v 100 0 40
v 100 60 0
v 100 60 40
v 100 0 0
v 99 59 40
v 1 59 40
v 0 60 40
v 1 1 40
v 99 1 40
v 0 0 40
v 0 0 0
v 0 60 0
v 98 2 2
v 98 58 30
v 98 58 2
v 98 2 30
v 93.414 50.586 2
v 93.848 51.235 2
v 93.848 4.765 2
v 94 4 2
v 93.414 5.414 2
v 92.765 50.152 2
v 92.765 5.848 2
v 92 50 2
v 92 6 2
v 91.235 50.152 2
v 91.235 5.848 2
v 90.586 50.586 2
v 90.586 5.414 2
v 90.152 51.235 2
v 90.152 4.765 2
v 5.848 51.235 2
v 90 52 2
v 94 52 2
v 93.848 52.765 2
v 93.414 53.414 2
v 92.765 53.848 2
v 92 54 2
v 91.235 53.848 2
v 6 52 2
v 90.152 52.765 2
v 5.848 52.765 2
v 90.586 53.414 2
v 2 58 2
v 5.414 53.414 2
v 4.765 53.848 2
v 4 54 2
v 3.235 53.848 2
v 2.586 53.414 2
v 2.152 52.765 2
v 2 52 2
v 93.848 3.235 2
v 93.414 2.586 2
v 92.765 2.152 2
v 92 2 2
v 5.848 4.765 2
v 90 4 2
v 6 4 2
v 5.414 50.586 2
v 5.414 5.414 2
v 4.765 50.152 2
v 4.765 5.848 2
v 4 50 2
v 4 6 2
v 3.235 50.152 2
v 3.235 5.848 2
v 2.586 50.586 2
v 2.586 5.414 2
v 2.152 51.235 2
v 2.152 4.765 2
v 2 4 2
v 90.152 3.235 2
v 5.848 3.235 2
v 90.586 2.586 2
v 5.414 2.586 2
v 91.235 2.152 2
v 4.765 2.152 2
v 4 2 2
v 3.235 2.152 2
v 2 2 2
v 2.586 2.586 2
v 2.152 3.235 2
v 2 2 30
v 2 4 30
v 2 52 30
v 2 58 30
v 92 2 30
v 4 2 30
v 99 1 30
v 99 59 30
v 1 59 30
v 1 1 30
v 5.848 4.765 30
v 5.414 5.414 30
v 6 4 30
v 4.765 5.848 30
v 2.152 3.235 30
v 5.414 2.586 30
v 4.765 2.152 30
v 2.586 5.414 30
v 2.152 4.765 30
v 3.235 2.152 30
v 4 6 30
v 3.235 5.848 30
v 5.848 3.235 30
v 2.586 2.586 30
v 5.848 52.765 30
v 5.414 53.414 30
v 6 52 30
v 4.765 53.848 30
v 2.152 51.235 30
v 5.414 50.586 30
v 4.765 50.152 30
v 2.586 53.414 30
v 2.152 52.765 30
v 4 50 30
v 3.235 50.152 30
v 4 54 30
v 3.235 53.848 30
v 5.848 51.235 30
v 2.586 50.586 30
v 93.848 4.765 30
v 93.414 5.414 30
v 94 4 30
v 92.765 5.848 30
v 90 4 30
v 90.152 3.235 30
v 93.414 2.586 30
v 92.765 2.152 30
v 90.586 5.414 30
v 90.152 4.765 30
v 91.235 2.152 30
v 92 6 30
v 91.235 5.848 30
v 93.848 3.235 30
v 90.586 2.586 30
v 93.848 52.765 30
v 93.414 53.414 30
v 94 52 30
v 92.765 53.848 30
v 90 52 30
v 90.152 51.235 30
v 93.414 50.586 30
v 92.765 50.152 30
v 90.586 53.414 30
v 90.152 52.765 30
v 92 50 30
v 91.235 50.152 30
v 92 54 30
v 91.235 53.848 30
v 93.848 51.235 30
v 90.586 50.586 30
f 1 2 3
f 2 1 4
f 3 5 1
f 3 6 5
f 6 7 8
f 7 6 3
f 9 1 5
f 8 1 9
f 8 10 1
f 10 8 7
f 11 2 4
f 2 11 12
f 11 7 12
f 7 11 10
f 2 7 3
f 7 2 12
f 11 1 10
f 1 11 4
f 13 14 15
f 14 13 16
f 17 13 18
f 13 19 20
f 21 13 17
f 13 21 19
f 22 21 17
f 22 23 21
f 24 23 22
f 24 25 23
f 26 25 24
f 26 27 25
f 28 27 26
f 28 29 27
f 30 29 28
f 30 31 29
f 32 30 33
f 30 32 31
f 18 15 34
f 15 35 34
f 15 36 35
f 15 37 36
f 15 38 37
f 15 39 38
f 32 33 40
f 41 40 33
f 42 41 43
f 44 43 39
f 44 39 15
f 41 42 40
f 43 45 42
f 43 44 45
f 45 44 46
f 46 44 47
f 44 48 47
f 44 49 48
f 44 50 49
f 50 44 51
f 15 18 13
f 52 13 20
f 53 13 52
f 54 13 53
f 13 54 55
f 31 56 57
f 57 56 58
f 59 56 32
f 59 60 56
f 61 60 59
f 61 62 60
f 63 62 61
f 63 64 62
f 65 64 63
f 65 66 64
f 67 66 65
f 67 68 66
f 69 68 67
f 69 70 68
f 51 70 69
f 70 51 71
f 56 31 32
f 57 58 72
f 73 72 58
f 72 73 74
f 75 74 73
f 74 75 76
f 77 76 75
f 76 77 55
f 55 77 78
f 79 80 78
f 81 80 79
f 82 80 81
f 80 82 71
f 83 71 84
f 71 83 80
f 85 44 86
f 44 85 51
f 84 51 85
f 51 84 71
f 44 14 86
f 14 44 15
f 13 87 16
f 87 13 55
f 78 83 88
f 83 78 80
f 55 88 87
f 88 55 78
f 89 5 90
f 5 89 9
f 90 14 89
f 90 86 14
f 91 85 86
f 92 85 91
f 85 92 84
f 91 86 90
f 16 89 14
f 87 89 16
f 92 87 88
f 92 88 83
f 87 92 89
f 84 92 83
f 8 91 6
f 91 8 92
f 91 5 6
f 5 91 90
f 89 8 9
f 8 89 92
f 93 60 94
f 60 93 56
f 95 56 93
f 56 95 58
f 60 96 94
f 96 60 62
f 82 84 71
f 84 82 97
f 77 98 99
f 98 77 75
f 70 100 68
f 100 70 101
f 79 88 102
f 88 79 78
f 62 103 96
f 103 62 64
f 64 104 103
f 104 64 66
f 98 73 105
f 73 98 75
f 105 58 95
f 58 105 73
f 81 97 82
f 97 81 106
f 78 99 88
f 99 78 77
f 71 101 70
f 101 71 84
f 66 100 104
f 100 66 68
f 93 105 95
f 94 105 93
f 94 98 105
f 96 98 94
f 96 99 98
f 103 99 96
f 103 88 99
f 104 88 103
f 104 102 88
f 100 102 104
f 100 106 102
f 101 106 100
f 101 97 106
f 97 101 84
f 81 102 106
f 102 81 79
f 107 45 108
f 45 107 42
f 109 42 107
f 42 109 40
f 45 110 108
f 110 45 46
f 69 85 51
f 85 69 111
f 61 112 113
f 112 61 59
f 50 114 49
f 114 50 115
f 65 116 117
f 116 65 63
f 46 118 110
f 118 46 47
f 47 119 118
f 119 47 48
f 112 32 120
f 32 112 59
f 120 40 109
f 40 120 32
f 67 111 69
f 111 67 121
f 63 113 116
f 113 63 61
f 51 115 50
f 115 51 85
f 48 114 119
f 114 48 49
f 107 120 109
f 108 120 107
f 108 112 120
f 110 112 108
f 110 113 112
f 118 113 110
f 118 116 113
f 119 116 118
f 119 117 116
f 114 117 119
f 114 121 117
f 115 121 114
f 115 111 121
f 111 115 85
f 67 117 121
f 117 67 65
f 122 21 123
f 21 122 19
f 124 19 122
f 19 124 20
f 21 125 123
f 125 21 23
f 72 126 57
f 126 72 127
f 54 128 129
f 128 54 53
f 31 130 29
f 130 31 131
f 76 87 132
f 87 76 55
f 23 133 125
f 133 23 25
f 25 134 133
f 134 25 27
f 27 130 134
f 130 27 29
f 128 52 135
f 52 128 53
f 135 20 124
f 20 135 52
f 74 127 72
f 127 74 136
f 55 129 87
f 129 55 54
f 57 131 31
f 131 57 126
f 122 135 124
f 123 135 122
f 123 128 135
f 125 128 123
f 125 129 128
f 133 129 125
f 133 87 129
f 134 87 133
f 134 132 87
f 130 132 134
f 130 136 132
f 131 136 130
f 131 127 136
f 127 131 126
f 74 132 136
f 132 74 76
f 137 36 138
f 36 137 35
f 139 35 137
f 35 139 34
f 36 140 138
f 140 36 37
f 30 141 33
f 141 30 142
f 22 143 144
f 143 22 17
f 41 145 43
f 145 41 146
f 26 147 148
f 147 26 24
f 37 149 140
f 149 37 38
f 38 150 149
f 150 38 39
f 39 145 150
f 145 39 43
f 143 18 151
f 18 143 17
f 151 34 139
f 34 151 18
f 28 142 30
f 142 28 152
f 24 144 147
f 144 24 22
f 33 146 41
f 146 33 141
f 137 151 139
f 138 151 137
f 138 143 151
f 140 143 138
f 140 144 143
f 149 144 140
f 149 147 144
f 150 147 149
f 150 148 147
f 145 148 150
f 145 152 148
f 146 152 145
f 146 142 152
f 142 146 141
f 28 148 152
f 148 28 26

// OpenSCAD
// Electronic: Project enclosure box

module enclosure(width=100, depth=60, height=40, wall=2, 
                 lid_height=10) {
    difference() {
        // Outer box
        cube([width, depth, height]);
        // Inner cavity
        translate([wall, wall, wall])
            cube([width-wall*2, depth-wall*2, height]);
        // Lid slot
        translate([wall/2, wall/2, height-lid_height])
            cube([width-wall, depth-wall, lid_height+1]);
    }
    // Mounting posts
    for (x = [wall*2, width-wall*4])
        for (y = [wall*2, depth-wall*4])
            translate([x, y, wall])
                cylinder(d=wall*2, h=height-lid_height-wall, $fn=16);
}

enclosure();
